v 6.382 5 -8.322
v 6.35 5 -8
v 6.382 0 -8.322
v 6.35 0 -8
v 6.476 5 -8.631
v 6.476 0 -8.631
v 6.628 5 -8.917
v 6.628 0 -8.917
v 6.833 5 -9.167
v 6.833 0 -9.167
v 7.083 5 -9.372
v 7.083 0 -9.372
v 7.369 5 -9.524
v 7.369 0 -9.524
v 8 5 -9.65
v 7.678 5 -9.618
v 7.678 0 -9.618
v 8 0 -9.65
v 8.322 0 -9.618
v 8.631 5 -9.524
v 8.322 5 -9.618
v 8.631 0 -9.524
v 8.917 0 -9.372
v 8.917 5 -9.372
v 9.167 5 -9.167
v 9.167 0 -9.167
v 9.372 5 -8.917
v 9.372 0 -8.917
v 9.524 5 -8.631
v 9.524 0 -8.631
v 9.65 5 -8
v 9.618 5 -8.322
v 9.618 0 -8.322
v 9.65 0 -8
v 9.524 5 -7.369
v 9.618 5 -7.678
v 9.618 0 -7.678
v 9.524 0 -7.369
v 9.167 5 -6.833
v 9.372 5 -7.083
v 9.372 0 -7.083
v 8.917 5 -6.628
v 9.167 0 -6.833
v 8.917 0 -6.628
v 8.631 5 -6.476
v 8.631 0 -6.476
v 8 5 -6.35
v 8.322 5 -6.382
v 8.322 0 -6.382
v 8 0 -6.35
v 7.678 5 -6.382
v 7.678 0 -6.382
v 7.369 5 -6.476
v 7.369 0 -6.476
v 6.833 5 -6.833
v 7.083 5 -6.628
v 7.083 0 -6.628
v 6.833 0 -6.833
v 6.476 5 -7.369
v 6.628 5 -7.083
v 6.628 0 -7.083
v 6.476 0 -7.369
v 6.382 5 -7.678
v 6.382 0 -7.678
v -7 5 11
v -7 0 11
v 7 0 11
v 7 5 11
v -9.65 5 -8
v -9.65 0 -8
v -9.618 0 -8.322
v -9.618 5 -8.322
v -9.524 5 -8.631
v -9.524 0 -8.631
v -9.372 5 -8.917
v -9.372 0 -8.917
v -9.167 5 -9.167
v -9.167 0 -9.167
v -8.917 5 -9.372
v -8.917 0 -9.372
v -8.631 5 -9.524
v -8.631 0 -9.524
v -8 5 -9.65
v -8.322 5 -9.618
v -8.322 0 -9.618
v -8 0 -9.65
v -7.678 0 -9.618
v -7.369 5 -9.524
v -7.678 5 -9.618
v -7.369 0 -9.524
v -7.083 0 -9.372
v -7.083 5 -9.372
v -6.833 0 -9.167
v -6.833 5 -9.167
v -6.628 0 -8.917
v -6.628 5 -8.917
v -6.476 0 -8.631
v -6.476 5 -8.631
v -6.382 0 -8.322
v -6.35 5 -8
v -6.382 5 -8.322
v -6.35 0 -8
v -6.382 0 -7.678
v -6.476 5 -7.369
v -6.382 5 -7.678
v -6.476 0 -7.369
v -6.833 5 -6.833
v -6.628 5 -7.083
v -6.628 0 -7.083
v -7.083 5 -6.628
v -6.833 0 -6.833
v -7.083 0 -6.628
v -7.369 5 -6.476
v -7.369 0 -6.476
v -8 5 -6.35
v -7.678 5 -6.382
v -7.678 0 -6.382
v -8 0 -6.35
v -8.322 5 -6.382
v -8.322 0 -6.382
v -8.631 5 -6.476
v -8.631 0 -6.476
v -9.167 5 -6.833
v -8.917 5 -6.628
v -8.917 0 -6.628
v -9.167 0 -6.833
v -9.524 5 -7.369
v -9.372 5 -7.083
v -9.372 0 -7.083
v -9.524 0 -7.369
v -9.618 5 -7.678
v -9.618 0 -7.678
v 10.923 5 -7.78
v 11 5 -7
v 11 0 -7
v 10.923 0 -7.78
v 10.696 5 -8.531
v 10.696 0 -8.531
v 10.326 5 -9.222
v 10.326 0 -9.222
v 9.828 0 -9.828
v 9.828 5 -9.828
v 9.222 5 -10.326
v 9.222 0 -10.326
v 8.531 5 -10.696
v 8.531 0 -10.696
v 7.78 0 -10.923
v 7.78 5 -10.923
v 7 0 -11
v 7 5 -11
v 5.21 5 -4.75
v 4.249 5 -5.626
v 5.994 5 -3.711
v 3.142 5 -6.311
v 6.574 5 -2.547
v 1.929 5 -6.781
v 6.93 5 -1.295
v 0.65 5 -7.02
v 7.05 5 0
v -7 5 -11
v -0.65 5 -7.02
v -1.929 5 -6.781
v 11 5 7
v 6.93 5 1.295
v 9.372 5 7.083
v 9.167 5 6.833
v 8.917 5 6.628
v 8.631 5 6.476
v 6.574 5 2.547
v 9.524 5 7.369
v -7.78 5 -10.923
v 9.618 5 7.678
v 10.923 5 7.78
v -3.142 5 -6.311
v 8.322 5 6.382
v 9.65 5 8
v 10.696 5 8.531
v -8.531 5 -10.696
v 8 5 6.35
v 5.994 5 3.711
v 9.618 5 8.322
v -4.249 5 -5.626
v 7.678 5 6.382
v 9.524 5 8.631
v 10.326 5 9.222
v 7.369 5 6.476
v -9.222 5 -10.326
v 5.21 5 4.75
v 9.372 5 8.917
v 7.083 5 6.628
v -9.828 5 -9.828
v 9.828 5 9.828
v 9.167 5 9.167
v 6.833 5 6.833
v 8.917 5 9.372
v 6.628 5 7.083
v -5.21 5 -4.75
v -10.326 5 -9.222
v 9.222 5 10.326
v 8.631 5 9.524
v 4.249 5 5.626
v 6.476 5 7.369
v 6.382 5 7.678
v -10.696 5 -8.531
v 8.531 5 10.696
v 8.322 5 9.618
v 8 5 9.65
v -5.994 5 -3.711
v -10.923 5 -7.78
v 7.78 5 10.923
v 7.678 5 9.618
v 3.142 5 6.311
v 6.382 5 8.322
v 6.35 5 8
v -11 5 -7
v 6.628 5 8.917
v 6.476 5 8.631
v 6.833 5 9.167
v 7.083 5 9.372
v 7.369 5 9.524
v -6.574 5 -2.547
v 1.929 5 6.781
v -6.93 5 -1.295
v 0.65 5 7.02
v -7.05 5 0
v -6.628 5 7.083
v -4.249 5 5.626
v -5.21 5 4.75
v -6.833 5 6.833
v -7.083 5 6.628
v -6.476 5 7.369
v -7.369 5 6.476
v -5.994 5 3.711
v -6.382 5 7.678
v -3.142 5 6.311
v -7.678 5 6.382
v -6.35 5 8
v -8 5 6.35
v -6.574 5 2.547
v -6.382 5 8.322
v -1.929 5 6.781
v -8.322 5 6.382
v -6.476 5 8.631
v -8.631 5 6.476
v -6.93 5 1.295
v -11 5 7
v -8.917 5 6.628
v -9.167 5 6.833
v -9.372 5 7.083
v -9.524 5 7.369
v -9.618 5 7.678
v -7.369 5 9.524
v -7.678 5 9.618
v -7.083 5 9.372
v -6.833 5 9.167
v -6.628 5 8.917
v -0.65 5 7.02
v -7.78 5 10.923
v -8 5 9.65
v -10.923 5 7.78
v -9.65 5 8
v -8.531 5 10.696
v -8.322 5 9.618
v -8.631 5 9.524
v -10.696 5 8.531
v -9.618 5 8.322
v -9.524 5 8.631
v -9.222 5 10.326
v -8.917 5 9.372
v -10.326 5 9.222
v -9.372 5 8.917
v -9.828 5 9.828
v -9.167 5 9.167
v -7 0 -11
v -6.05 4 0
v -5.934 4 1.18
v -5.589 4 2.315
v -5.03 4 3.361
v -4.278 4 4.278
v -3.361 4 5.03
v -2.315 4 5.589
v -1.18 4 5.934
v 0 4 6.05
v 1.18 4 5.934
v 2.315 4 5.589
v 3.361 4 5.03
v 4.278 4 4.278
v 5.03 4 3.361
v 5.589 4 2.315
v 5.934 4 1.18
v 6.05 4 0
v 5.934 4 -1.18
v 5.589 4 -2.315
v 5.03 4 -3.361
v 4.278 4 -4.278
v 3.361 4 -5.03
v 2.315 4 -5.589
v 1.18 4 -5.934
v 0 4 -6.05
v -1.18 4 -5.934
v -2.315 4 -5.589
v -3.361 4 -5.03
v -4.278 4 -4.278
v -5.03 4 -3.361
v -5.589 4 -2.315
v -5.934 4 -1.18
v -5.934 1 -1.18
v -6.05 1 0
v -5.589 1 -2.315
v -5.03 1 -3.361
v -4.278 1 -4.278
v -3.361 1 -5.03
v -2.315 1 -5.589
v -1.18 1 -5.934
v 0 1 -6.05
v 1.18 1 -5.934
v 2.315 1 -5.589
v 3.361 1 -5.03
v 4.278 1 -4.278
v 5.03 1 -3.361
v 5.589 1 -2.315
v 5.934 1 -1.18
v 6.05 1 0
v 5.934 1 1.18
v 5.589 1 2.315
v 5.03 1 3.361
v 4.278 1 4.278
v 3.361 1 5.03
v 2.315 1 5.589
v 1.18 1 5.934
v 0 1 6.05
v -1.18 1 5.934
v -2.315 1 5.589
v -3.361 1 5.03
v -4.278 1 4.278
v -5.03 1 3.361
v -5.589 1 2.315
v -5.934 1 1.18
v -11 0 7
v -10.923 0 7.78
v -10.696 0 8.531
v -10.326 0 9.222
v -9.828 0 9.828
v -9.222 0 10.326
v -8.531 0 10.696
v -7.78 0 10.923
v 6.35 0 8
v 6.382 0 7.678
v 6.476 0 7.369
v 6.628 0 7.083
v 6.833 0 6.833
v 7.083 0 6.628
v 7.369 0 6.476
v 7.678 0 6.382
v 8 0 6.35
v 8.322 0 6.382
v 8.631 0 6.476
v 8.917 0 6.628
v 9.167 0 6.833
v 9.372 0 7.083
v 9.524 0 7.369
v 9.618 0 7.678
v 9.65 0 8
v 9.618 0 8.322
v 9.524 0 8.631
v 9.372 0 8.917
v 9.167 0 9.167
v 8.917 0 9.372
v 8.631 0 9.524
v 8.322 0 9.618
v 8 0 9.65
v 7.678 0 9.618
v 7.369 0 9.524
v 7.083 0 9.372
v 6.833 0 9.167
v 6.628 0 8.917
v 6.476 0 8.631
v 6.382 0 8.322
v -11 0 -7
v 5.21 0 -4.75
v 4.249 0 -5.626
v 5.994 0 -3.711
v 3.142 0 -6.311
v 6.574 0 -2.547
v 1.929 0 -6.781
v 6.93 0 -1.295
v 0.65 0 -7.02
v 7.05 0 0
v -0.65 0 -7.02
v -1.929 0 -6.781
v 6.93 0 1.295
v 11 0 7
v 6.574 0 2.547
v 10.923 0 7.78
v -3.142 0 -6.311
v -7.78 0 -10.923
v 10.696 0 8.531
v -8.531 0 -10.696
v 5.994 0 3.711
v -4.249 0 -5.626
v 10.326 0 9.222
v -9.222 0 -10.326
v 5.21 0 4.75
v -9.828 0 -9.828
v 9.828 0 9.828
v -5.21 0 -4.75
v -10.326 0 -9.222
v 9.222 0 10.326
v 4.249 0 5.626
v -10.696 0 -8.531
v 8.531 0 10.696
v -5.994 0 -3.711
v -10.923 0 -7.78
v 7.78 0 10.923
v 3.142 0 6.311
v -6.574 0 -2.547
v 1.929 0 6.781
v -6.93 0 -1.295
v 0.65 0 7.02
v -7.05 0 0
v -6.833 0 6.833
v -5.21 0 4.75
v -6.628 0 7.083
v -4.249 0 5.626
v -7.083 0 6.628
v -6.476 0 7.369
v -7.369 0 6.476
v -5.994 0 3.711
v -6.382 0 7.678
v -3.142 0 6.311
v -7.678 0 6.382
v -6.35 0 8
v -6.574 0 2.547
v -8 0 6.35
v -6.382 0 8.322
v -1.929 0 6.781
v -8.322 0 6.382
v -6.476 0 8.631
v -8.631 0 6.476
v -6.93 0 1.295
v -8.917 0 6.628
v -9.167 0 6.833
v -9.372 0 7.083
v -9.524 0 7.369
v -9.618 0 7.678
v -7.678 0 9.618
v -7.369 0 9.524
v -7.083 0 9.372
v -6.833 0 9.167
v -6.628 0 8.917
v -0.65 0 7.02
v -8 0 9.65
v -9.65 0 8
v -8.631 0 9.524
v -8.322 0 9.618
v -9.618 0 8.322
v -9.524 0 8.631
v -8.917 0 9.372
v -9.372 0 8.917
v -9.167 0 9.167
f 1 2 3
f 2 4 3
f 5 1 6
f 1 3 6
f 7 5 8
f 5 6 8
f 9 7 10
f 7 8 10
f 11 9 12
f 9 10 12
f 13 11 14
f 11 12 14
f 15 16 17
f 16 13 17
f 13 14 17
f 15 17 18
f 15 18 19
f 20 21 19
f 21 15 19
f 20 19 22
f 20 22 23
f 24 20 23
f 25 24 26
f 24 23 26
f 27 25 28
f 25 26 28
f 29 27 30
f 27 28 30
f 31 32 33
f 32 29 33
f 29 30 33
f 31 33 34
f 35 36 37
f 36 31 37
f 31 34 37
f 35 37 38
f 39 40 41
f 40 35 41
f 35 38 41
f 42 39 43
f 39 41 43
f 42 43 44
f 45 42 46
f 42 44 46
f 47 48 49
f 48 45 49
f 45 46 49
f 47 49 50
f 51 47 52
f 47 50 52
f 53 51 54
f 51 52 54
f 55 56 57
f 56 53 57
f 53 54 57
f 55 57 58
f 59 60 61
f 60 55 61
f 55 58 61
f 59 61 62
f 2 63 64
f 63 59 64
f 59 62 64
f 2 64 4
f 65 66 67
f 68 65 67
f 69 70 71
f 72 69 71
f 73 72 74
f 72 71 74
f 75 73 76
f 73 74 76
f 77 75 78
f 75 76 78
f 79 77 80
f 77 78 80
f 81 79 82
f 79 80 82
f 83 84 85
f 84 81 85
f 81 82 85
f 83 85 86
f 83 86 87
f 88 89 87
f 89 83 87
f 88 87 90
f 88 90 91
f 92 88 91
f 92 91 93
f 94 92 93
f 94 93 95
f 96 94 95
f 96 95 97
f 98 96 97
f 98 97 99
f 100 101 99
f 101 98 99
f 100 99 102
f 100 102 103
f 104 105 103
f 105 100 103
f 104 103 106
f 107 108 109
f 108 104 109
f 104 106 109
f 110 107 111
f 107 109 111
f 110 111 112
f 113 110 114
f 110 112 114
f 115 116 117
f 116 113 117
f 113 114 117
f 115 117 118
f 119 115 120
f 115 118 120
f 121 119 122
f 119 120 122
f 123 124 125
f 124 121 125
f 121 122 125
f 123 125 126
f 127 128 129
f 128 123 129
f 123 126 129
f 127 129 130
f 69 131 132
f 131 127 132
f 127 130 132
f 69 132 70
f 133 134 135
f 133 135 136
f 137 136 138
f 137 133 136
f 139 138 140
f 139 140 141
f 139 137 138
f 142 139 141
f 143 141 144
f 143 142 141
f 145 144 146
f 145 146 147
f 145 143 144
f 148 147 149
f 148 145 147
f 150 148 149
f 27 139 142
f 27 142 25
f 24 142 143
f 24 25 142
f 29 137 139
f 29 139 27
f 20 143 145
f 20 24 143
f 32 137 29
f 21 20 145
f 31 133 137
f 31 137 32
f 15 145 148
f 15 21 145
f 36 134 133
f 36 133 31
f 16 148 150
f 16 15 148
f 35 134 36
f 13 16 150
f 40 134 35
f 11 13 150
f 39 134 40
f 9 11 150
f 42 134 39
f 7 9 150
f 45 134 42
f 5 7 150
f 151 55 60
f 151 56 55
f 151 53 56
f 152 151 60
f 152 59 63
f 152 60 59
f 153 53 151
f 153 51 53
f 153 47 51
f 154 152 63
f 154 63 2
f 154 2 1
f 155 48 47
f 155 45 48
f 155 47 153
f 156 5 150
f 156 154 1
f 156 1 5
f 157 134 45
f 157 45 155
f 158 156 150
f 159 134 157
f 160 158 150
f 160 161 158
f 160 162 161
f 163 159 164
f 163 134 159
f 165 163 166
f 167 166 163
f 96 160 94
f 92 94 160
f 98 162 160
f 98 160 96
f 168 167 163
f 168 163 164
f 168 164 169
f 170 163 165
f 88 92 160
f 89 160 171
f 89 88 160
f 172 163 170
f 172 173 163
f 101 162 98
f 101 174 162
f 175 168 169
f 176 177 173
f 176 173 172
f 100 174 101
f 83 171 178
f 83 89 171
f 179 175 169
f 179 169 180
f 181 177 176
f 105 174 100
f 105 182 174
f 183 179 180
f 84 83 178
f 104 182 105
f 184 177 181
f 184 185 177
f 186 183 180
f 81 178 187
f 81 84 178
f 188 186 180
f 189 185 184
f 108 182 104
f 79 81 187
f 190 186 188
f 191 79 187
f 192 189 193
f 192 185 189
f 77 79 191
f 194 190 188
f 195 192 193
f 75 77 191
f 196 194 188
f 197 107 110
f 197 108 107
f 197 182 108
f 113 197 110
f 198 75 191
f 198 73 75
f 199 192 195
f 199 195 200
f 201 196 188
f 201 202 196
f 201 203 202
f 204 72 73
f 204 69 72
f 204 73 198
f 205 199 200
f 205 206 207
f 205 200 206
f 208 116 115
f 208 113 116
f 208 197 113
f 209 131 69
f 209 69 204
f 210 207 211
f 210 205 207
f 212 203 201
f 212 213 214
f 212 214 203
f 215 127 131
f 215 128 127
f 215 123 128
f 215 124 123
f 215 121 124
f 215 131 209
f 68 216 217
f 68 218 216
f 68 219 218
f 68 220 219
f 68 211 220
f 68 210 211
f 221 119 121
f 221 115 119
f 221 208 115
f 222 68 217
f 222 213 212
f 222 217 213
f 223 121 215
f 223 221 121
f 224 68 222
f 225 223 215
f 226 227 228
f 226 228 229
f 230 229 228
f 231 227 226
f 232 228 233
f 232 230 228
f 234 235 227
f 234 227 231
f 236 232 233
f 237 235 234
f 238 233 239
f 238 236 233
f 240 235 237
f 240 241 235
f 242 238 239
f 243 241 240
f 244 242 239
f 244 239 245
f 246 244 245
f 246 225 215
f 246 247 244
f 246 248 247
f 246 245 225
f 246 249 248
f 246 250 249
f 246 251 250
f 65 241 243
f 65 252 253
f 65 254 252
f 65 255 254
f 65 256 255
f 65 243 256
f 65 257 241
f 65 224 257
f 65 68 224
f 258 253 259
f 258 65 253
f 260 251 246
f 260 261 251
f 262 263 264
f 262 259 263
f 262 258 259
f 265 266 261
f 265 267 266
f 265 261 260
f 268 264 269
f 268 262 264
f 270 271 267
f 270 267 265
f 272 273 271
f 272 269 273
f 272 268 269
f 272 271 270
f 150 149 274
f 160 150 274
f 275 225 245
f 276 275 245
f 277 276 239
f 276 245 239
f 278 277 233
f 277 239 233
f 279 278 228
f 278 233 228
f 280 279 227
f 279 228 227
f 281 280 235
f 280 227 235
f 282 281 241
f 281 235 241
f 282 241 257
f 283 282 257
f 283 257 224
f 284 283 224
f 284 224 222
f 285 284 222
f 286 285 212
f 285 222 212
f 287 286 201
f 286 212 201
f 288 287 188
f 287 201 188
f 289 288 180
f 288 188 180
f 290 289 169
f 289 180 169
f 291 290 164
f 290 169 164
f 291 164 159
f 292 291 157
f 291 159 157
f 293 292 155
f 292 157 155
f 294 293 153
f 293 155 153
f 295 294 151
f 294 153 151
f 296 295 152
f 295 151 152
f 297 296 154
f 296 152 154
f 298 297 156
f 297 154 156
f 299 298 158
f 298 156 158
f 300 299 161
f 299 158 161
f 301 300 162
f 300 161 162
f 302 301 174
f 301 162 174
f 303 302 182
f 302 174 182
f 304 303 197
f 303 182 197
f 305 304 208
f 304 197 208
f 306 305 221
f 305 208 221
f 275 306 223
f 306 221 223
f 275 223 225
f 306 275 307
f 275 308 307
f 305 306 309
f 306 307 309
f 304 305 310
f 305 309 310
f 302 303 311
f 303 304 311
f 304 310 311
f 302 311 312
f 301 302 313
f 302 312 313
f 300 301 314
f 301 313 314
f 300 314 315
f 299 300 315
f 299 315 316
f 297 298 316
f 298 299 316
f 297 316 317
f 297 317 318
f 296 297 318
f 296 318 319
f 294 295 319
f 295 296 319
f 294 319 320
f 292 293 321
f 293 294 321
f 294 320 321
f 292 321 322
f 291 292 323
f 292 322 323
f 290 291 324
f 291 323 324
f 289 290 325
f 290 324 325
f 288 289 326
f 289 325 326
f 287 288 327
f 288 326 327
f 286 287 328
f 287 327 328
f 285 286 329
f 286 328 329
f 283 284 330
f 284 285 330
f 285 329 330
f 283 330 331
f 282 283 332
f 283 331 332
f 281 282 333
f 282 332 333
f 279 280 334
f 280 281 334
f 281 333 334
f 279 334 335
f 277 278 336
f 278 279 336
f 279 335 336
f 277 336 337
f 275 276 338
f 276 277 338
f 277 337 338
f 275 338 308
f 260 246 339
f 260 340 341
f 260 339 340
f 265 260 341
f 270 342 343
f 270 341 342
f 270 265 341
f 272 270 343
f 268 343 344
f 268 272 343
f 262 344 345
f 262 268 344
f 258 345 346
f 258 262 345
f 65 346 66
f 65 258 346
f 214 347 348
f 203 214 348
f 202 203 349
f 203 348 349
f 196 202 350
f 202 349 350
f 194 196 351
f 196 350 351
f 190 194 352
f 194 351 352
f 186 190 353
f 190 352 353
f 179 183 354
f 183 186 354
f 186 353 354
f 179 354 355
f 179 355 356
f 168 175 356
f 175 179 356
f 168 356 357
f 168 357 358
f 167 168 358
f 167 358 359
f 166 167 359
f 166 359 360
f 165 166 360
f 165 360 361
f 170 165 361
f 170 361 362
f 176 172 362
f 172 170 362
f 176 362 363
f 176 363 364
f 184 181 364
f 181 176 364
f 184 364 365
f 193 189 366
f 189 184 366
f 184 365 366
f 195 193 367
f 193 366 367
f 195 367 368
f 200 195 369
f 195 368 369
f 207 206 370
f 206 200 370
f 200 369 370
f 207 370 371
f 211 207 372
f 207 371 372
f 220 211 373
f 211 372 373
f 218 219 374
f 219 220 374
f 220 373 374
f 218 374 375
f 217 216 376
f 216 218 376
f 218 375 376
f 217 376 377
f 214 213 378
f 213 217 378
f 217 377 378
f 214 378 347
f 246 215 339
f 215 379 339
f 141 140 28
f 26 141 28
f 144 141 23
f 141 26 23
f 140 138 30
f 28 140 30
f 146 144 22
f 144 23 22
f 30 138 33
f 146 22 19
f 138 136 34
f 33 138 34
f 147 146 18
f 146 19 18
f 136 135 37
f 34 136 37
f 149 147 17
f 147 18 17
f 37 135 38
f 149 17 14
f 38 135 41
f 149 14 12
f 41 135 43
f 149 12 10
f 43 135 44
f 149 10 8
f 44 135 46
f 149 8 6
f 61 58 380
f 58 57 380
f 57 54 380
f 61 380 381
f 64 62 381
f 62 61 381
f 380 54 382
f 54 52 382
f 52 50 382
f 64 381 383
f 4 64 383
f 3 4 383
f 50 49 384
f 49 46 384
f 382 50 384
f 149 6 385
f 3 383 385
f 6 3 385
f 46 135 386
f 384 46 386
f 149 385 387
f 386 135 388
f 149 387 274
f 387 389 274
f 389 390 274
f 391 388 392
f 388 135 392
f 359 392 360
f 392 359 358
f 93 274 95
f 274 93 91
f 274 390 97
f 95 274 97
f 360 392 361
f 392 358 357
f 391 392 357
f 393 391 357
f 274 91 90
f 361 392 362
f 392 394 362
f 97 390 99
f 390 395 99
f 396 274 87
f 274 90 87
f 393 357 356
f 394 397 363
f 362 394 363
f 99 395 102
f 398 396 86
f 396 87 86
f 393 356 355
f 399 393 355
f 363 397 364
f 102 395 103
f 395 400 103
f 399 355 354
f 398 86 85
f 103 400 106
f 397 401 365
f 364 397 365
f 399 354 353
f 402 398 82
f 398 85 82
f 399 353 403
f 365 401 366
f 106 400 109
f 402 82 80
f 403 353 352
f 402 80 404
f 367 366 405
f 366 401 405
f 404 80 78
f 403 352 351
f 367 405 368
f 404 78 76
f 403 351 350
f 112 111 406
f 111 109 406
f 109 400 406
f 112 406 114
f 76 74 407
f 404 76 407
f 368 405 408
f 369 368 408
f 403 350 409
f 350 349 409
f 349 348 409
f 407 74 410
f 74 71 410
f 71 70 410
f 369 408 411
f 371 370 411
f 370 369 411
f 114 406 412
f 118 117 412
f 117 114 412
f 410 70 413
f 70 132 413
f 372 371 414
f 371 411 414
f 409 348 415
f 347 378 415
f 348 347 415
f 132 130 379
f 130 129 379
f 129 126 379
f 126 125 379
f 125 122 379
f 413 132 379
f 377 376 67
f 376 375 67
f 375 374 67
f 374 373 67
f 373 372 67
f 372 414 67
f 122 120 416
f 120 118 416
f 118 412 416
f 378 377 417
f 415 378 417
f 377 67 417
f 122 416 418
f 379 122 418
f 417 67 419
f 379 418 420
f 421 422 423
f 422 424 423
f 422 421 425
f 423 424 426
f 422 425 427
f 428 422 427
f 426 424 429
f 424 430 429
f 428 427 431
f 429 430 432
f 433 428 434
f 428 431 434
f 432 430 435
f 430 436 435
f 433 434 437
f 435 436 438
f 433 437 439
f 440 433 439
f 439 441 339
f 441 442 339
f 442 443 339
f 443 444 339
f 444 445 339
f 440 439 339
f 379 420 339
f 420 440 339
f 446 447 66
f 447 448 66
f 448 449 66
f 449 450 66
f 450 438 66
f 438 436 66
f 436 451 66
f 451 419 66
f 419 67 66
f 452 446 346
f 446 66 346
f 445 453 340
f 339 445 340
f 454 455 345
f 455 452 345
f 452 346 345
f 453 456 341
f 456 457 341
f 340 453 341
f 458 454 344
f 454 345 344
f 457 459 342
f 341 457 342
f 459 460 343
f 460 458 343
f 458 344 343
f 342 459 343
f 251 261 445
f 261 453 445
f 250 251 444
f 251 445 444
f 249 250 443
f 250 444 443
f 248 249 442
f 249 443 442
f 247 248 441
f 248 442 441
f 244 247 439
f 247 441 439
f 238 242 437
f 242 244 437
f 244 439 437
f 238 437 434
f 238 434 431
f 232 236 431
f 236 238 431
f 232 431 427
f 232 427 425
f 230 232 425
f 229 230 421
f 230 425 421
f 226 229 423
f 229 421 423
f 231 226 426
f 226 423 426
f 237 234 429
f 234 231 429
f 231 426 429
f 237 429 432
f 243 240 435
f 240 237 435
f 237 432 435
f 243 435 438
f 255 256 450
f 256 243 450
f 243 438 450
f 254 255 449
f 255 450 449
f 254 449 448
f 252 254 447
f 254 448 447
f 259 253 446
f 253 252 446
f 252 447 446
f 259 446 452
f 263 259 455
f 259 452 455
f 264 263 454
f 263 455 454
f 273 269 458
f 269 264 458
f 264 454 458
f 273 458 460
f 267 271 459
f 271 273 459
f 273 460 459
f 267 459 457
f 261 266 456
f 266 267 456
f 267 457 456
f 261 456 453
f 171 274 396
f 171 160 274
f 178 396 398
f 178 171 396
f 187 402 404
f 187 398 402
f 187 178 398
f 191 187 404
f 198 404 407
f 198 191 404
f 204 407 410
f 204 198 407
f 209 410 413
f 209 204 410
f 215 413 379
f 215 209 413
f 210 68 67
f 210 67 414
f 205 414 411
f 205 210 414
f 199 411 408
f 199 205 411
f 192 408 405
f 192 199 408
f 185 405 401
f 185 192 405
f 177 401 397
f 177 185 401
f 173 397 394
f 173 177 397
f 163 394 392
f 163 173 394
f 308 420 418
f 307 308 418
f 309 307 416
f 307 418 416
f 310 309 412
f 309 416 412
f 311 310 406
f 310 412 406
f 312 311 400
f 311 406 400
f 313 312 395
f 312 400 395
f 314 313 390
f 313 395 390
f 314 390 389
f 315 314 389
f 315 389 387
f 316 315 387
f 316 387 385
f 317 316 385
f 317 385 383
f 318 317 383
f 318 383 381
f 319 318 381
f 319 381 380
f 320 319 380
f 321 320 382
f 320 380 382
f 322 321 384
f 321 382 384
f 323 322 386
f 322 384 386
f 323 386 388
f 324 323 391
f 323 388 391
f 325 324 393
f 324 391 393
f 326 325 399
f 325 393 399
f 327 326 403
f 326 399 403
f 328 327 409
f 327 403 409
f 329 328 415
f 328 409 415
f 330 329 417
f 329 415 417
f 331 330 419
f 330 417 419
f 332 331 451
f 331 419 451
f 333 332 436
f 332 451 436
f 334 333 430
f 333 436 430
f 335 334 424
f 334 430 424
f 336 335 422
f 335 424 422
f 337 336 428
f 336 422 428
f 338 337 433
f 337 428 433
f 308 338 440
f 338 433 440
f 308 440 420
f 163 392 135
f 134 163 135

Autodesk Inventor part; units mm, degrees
ref_plane "YZ Plane" through (0, 0, 0) normal (1, 0, 0) x (0, 1, 0)
ref_plane "XZ Plane" through (0, 0, 0) normal (0, 1, 0) x (-1, 0, 0)
ref_plane "XY Plane" through (0, 0, 0) normal (0, 0, 1) x (1, 0, 0)
sketch "Sketch1" plane through (0, 0, 0) normal (0, 1, 0) x (-1, 0, 0)
  line L0 (-8, -8) -> (8, -8) construction
  line L1 (8, -8) -> (8, 8) construction
  line L2 (8, 8) -> (-8, 8) construction
  line L3 (-8, 8) -> (-8, -8) construction
  line L4 (-8, -8) -> (8, 8) construction
  line L5 (8, -8) -> (-8, 8) construction
  circle A0 centre (-8, 8) radius 1.65
  line L6 (0, 0) -> (0, 2.722) construction
  line L7 (0, 2.722) -> (0, 0) construction
  line L8 (-3.7265, 0) -> (0, 0) construction
  circle A1 centre (8, 8) radius 1.65
  line L9 (8, -8) -> (-8, -8) construction
  circle A2 centre (-8, -8) radius 1.65
  circle A3 centre (8, -8) radius 1.65
  line L10 (-11, -11) -> (11, -11)
  line L11 (11, -11) -> (11, 11)
  line L12 (11, 11) -> (-11, 11)
  line L13 (-11, 11) -> (-11, -11)
  line L14 (-11, -11) -> (11, 11) construction
  line L15 (11, -11) -> (-11, 11) construction
  circle A4 centre (0, 0) radius 6.05
  dimension "d0" = 16
  dimension "d1" = 16
  dimension "d2" = 3.3
  dimension "d3" = 22
  dimension "d4" = 22
  dimension "d5" = 12.1
extrude "Extrusion1" add sketch "Sketch1" along normal blind 5
fillet "Fillet1" radius 4 4 edges at (-11, 2.5, -11) (-11, 2.5, 11) (11, 2.5, 11) (11, 2.5, -11)
chamfer "Chamfer1" distance 1 angle 45 2 edges at (6.05, 5, 0) (6.05, 0, 0)
properties part number "Chumacera" material "ABS Plastic"
